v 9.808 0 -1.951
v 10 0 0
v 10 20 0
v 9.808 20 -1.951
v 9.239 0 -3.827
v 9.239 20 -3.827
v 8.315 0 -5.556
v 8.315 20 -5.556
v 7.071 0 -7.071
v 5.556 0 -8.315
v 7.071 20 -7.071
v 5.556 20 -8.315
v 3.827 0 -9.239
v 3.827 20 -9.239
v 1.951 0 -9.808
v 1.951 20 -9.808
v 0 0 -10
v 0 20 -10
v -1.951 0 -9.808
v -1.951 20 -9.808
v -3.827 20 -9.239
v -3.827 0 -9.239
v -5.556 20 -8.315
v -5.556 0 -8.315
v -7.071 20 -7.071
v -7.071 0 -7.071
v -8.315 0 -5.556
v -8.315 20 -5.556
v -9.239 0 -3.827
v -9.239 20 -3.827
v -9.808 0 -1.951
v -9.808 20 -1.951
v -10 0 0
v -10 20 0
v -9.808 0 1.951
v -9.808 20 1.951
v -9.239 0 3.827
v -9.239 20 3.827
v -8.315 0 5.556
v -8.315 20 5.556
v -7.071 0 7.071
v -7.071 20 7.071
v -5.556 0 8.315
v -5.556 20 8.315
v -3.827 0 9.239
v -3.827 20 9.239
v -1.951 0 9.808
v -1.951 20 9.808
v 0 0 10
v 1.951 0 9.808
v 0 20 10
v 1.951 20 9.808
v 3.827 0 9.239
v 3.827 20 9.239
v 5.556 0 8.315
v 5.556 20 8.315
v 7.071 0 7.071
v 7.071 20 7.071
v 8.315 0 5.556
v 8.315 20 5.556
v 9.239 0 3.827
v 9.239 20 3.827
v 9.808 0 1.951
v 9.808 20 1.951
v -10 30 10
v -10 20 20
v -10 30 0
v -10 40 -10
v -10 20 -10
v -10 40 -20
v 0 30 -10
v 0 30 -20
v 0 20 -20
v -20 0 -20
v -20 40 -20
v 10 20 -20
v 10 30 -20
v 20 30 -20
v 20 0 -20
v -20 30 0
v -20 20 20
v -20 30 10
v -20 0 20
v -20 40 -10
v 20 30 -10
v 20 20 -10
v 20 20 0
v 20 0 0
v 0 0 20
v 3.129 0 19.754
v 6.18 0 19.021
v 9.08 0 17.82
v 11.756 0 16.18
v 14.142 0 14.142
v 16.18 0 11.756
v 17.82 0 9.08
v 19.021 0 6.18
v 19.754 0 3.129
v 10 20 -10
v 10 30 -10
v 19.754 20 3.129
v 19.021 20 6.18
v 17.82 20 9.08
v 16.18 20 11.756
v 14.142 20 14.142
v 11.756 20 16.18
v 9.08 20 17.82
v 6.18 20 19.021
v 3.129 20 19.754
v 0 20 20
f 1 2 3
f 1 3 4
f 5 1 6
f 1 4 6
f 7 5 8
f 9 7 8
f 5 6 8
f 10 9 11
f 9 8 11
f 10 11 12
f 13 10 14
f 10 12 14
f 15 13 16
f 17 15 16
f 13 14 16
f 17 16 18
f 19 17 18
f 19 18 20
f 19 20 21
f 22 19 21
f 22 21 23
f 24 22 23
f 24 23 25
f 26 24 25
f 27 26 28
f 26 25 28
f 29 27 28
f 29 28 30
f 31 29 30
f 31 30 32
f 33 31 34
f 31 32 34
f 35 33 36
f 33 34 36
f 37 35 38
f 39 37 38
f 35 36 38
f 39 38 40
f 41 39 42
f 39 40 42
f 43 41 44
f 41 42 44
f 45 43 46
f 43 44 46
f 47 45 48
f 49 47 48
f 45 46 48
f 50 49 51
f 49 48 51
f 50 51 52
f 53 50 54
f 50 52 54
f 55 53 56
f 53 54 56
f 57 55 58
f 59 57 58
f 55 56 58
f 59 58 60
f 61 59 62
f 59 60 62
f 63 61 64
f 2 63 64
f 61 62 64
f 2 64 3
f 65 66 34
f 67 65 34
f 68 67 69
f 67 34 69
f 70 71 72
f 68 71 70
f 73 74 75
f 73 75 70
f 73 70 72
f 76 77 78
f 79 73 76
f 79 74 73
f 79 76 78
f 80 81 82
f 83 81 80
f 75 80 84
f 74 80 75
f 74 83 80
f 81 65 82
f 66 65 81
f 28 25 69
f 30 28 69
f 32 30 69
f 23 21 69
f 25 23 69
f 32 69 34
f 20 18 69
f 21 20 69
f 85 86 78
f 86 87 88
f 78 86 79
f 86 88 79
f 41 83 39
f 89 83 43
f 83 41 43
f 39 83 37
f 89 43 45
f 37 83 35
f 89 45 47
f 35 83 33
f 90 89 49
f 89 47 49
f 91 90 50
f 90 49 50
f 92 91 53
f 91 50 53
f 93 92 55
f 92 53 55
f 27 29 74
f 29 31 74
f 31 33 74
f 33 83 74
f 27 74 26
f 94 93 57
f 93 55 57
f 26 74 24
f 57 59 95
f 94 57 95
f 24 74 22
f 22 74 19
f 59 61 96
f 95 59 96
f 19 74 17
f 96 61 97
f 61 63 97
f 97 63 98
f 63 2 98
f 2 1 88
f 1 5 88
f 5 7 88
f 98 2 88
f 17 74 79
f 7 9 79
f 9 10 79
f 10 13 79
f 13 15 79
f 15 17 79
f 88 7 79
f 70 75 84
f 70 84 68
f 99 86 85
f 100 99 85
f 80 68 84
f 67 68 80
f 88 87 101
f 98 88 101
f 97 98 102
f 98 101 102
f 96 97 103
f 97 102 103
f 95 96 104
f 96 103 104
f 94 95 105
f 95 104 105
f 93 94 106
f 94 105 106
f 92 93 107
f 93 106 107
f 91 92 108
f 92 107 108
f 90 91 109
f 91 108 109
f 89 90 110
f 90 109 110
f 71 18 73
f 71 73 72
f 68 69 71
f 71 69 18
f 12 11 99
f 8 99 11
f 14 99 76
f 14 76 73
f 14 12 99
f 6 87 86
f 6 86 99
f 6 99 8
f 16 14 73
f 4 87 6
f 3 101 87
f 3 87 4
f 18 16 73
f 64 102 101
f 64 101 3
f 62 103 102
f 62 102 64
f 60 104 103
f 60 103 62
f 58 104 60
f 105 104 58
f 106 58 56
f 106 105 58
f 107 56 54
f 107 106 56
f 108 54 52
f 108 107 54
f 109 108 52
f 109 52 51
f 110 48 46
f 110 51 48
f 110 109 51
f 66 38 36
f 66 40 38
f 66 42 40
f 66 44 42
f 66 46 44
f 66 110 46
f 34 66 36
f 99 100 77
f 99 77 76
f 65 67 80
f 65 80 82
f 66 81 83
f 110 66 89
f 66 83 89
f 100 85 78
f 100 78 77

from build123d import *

# Parameters (mm, degrees)
SKETCH_1_W          = 40
SKETCH_1_H          = 40
EXTRUDE_1_DEPTH     = 40
SKETCH_2_R          = 10
CUT_EXTRUDE_1_DEPTH = 41
SKETCH_3_W          = 30
SKETCH_3_H          = 20
CUT_EXTRUDE_2_DEPTH = 20
CUT_EXTRUDE_3_DEPTH = 41
CUT_EXTRUDE_4_DEPTH = 41
SKETCH_7_W          = 10
SKETCH_7_H          = 10
CUT_EXTRUDE_5_DEPTH = 20
CUT_EXTRUDE_6_DEPTH = 21


with BuildPart() as part:
    # 草圖1 → 填料-伸長1 (new body)
    with BuildSketch(Plane(origin=(0, 0, 0), x_dir=(1, 0, 0), z_dir=(0, 1, 0))):
        Rectangle(SKETCH_1_W, SKETCH_1_H)
    extrude(amount=EXTRUDE_1_DEPTH)

    # 草圖2 → 除料-伸長1 (cut, through all)
    with BuildSketch(Plane(origin=(0, 40, 0), x_dir=(1, 0, 0), z_dir=(0, 1, 0))):
        Circle(SKETCH_2_R)
        with BuildLine():
            Line((0, -20), (20, -20))
            Line((20, -20), (20, 0))
            ThreePointArc((20, 0), (14.142135624, -14.142135624), (0, -20))
        make_face()
    extrude(amount=-CUT_EXTRUDE_1_DEPTH, mode=Mode.SUBTRACT)

    # 草圖3 → 除料-伸長2 (cut)
    with BuildSketch(Plane(origin=(20, 0, 0), x_dir=(0, 0, -1), z_dir=(1, 0, 0))):
        with Locations((-5, 30)):
            Rectangle(SKETCH_3_W, SKETCH_3_H)
    extrude(amount=-CUT_EXTRUDE_2_DEPTH, mode=Mode.SUBTRACT)

    # 草圖4 → 除料-伸長3 (cut, through all)
    with BuildSketch(Plane.XY.offset(20)):
        Polygon((20, 30), (10, 30), (10, 20), (0, 20), (0, 30), (-10, 40), (20, 40), align=None)
    extrude(amount=-CUT_EXTRUDE_3_DEPTH, mode=Mode.SUBTRACT)

    # 草圖5 → 除料-伸長4 (cut, through all)
    with BuildSketch(Plane(origin=(20, 0, 0), x_dir=(0, 0, -1), z_dir=(1, 0, 0))):
        Polygon((10, 40), (0, 30), (-10, 30), (-20, 20), (-20, 40), align=None)
    extrude(amount=-CUT_EXTRUDE_4_DEPTH, mode=Mode.SUBTRACT)

    # 草圖7 → 除料-伸長5 (cut)
    with BuildSketch(Plane.XY.offset(20)):
        with Locations((-5, 25)):
            Rectangle(SKETCH_7_W, SKETCH_7_H)
    extrude(amount=-CUT_EXTRUDE_5_DEPTH, mode=Mode.SUBTRACT)

    # 草圖9 → 除料-伸長6 (cut, through all)
    with BuildSketch(Plane(origin=(0, 20, 0), x_dir=(1, 0, 0), z_dir=(0, 1, 0))):
        with BuildLine():
            ThreePointArc((-7.071067812, 7.071067812), (-9.238795325, 3.826834324), (-10, 0))
            Line((-10, 0), (-10, 10))
            Line((-10, 10), (0, 10))
            ThreePointArc((0, 10), (-3.826834324, 9.238795325), (-7.071067812, 7.071067812))
        make_face()
    extrude(amount=CUT_EXTRUDE_6_DEPTH, mode=Mode.SUBTRACT)


solid = part.part
